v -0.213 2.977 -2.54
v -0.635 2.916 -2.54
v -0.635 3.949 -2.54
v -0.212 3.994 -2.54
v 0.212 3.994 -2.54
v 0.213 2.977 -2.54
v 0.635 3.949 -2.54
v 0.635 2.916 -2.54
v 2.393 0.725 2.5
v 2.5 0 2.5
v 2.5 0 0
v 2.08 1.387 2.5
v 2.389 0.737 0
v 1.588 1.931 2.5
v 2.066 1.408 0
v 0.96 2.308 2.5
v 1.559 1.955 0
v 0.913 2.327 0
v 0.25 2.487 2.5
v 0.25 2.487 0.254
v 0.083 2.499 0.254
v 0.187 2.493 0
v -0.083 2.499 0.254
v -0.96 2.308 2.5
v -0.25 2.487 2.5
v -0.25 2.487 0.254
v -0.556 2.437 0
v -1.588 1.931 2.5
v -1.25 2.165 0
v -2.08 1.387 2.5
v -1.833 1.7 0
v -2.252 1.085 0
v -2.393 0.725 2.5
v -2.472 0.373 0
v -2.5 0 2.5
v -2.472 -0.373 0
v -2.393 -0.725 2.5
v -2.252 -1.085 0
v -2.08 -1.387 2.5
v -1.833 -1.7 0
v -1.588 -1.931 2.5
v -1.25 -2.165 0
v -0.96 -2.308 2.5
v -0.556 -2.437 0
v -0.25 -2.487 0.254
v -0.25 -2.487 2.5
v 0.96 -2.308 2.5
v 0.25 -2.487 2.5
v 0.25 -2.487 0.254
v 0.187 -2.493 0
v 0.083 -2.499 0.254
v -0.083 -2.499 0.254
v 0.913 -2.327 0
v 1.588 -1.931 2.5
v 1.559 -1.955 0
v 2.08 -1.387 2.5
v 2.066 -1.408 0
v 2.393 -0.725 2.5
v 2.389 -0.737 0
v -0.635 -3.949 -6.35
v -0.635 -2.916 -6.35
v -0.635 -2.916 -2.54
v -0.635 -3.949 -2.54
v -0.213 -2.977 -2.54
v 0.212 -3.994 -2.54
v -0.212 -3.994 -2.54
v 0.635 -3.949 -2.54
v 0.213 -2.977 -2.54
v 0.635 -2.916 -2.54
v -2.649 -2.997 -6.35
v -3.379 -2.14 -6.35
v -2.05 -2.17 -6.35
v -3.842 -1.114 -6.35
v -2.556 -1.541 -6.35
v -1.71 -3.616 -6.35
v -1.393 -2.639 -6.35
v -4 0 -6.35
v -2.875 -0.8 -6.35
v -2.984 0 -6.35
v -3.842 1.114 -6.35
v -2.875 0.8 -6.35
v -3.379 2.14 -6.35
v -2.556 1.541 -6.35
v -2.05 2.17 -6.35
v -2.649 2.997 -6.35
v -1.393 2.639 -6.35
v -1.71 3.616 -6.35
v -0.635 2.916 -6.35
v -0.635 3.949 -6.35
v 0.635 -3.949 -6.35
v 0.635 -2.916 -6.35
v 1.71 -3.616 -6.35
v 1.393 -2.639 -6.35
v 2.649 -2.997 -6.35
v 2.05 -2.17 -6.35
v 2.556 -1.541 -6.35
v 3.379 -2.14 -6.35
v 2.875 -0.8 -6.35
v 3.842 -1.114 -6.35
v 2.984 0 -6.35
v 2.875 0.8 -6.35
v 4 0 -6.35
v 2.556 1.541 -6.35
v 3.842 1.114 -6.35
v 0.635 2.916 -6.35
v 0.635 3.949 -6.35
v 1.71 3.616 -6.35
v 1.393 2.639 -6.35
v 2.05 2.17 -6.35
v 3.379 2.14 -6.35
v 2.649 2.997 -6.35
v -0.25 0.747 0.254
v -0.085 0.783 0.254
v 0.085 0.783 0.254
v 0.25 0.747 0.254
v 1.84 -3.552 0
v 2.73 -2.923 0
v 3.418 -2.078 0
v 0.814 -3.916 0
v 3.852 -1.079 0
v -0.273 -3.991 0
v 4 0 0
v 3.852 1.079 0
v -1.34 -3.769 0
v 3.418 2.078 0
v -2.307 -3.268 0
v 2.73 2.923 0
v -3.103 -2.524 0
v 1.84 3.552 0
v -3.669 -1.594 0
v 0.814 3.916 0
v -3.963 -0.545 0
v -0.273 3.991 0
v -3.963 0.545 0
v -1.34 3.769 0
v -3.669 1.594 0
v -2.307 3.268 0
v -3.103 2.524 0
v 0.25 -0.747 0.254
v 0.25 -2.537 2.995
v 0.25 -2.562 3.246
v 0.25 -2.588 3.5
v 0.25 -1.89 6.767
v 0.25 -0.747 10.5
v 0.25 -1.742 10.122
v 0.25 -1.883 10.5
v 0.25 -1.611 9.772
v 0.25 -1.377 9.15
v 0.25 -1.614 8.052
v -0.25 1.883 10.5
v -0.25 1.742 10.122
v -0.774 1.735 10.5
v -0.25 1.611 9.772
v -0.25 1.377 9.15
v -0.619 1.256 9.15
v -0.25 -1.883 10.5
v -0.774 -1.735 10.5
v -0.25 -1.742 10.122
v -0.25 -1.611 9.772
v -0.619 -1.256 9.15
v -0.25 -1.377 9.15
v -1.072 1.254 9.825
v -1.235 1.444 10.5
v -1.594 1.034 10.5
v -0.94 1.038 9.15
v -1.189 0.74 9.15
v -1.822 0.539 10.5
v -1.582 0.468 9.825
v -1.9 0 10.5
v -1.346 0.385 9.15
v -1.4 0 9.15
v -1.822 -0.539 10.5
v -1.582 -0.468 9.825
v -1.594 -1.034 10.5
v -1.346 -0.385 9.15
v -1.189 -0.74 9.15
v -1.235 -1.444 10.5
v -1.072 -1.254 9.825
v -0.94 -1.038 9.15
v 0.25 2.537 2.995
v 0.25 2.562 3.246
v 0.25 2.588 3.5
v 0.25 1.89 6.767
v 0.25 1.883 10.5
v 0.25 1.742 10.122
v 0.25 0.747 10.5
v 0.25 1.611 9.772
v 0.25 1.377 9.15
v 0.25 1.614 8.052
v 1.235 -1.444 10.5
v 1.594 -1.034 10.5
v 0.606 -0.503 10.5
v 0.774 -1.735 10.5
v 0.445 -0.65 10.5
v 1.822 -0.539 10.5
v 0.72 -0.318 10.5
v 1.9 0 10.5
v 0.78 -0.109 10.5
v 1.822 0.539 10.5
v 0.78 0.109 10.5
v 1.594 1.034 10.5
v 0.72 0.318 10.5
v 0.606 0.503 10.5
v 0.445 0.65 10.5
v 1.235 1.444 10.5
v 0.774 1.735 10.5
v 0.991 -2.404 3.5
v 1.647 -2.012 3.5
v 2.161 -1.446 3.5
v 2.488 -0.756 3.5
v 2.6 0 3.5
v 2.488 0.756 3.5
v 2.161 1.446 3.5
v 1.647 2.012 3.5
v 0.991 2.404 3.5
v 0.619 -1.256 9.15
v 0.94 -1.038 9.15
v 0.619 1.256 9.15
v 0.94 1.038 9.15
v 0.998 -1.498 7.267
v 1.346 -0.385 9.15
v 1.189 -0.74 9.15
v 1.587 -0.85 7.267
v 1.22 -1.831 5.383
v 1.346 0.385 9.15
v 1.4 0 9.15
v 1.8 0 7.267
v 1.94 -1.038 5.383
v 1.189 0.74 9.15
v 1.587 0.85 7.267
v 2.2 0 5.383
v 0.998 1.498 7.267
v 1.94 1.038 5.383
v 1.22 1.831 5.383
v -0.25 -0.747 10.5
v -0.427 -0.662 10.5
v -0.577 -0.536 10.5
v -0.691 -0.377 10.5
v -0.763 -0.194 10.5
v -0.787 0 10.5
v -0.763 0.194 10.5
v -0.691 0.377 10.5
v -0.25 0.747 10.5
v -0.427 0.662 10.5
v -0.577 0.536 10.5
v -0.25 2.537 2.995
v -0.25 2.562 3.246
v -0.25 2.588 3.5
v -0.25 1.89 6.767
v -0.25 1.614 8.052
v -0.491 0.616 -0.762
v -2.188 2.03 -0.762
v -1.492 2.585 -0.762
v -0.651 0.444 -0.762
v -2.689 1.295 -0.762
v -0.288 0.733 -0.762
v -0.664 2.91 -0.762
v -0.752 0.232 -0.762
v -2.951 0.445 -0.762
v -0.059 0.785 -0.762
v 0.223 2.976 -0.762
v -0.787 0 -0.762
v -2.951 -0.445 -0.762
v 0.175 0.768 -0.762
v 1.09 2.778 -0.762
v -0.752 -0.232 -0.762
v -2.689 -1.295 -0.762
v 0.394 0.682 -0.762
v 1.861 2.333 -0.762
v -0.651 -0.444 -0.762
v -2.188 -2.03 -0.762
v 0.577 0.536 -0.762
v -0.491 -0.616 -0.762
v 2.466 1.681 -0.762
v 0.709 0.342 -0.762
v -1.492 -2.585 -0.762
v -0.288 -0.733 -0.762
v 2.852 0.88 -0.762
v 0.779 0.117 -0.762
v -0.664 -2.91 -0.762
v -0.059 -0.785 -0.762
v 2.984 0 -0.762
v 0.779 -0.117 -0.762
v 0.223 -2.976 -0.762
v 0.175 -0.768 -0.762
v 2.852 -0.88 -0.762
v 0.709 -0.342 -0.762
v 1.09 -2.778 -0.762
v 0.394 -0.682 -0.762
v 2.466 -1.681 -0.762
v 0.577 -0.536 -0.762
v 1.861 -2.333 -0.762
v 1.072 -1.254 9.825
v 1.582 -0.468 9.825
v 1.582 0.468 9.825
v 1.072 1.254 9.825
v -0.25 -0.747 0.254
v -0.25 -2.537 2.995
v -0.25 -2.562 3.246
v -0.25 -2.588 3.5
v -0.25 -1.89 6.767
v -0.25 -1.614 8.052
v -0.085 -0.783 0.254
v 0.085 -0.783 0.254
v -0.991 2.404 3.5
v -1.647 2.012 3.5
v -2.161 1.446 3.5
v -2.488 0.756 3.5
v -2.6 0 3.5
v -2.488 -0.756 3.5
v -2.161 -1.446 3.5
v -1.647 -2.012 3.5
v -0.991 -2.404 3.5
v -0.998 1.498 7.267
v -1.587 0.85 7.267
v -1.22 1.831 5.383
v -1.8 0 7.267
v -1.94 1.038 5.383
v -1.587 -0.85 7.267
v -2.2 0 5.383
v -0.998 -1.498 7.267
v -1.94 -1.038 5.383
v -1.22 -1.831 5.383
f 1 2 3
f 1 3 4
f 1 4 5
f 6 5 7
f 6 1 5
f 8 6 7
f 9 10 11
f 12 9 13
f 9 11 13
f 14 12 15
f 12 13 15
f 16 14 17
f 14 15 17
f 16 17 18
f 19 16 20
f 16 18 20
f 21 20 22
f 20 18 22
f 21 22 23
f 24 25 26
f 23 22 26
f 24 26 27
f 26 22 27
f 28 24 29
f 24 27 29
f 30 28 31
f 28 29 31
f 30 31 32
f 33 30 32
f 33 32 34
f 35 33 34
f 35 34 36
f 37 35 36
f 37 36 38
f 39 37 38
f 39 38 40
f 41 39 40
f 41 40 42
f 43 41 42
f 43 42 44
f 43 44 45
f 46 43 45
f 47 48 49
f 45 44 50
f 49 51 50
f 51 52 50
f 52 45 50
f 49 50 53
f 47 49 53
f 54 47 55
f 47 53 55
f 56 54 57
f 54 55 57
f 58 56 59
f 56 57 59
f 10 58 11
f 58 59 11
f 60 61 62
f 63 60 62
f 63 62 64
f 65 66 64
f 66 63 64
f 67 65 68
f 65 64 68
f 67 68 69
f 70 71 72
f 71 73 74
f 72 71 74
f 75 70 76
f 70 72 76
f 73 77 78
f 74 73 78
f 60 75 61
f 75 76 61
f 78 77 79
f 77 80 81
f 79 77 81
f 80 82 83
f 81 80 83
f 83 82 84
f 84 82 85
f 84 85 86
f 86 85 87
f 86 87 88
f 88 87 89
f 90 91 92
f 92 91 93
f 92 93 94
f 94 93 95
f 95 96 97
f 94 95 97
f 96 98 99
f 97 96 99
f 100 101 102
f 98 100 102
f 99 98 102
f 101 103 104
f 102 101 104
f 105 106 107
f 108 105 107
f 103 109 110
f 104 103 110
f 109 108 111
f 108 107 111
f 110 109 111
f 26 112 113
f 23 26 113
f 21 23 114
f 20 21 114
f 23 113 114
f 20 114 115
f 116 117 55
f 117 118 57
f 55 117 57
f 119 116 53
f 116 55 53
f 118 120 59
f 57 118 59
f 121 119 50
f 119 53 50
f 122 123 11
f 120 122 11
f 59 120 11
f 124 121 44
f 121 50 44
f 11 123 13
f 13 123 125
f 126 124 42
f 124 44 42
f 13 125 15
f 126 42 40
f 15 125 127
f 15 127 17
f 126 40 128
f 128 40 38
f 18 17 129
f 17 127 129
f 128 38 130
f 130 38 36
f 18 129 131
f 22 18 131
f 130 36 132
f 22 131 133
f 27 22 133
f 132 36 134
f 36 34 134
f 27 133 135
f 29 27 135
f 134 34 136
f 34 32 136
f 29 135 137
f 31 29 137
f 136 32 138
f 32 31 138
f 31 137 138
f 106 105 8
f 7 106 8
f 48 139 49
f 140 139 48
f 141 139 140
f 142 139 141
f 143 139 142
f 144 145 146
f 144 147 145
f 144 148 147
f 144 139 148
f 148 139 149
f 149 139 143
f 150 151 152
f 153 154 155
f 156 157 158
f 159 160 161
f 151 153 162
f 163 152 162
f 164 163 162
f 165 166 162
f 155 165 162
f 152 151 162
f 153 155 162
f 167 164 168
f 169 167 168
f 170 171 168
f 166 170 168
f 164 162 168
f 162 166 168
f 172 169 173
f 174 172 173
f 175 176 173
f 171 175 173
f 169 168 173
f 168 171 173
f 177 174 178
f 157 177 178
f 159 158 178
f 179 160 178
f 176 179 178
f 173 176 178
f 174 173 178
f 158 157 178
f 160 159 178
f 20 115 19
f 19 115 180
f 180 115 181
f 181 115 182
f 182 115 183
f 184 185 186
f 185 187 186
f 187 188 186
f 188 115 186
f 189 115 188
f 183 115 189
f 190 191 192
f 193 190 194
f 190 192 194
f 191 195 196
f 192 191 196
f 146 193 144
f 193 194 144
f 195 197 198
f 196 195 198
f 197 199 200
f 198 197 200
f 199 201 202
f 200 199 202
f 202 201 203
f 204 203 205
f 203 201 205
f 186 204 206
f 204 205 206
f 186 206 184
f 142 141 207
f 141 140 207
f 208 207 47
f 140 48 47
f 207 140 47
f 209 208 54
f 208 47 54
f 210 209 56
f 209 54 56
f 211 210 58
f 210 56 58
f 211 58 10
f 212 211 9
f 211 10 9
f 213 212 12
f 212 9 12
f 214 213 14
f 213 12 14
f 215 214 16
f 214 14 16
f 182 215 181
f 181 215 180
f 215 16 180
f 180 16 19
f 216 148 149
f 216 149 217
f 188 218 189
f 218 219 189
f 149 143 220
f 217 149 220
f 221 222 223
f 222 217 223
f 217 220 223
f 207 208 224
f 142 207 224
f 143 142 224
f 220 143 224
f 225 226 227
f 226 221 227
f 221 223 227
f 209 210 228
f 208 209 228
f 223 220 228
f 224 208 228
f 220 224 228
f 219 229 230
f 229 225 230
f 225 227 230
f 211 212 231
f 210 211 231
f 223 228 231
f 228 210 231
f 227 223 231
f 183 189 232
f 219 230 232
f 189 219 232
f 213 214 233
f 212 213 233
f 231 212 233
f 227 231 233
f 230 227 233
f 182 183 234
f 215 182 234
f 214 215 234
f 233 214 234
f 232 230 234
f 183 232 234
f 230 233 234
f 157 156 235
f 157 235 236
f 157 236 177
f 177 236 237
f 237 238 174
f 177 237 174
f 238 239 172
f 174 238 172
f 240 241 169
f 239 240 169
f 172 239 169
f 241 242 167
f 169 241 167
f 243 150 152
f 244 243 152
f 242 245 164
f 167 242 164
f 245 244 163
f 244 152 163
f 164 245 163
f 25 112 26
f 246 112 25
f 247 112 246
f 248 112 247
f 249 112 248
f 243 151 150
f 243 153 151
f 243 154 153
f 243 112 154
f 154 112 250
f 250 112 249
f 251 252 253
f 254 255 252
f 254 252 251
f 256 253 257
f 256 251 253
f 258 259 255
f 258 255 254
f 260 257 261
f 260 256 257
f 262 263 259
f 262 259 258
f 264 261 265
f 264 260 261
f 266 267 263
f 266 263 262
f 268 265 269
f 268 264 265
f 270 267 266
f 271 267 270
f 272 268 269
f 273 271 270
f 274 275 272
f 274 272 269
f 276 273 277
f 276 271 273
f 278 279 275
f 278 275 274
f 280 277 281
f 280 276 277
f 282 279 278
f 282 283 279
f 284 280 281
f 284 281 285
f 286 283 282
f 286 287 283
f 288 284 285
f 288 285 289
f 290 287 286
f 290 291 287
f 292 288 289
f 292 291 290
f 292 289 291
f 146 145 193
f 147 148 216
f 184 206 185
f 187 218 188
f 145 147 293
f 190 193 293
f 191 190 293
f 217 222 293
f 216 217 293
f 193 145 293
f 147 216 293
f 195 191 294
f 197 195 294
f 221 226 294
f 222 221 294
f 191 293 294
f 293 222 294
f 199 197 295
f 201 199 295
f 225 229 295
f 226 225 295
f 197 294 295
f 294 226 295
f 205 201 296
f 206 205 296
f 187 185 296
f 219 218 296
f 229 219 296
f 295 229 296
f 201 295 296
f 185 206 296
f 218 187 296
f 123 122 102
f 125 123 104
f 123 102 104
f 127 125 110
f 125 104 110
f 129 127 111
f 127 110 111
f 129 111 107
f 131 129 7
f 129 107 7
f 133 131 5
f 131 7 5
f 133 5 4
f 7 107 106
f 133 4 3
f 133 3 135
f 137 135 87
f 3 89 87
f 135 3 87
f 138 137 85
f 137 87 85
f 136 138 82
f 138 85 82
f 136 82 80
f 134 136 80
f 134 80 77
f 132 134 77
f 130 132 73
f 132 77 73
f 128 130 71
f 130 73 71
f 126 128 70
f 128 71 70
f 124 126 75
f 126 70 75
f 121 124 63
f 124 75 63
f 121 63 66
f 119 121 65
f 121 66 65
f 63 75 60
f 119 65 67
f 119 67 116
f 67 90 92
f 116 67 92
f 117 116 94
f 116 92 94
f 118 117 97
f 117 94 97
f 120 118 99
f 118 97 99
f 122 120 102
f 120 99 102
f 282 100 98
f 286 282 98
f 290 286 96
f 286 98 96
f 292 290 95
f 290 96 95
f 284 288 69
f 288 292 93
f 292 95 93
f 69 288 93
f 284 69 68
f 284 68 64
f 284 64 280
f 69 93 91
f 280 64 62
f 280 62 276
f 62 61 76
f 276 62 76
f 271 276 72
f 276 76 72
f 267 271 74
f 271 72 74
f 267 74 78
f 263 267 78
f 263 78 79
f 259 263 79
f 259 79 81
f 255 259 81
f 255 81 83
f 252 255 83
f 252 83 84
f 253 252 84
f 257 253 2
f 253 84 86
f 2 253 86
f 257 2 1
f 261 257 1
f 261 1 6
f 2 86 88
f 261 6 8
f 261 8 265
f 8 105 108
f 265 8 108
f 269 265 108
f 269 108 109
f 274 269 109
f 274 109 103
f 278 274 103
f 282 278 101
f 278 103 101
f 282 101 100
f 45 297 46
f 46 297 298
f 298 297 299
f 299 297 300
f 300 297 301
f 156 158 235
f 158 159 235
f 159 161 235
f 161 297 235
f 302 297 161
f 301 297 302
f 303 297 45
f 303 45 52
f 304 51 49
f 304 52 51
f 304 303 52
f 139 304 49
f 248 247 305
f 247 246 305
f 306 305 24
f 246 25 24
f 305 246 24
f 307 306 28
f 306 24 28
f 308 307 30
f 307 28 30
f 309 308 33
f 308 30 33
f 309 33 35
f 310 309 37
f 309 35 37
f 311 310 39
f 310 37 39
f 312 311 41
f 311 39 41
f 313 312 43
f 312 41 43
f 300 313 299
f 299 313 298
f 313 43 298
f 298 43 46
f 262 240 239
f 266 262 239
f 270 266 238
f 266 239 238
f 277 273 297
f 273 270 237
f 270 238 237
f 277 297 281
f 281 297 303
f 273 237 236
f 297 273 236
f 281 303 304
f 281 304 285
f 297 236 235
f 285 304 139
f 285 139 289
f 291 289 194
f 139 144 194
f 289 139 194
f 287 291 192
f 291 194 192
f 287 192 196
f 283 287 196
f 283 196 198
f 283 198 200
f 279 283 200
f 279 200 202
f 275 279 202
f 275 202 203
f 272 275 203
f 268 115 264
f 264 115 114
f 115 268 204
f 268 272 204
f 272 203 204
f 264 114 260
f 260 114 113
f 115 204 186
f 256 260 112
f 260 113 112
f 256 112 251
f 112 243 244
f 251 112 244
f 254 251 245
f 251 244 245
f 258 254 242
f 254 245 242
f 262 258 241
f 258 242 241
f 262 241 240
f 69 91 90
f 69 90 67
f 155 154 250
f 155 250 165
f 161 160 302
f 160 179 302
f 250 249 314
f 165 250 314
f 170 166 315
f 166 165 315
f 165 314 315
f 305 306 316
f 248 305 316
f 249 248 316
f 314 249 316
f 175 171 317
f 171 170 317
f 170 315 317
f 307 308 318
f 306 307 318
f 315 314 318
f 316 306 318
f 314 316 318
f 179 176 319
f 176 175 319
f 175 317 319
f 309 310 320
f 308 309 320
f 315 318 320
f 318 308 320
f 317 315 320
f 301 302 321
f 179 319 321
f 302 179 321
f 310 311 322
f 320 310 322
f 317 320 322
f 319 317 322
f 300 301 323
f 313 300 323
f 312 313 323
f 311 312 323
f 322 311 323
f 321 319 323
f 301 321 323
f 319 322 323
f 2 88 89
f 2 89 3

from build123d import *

# Parameters (mm, degrees)
SKETCH001_R          = 2.9845
POCKET_DEPTH         = 5.588
SKETCH002_R          = 0.7874
POCKET001_DEPTH      = 16.851
SKETCH004_W          = 0.5
SKETCH004_H          = 12.688059
SKETCH004_H_2        = 6.122161
POCKET003_DEPTH      = 5.0038
POCKET003_DEPTH_BACK = -5.0038
SKETCH005_W          = 1.27
SKETCH005_H          = 12.7
POCKET004_DEPTH      = 25.4
POCKET004_DEPTH_BACK = -23.7998


with BuildPart() as part:
    # Sketch → Revolution (revolve)
    with BuildSketch(Plane.XZ):
        Polygon((2.5, 0), (4, 0), (4, -6.35), (0, -6.35), (0, 0), (0, 10.5), (1.9, 10.5), (1.4, 9.15), (2.6, 3.5), (2.5, 2.5), align=None)
    revolve(axis=Axis((0, 0, 0), (0, 0, 1)))

    # Sketch001 (on Face5 of Revolution) → Pocket (cut)
    with BuildSketch(Plane(origin=(0, 0, -6.35), x_dir=(1, 0, 0), z_dir=(0, 0, -1))):
        Circle(SKETCH001_R)
    extrude(amount=-POCKET_DEPTH, mode=Mode.SUBTRACT)

    # Sketch002 (on Face6 of Pocket) → Pocket001 (cut, through all)
    with BuildSketch(Plane(origin=(0, 0, 10.5), x_dir=(-1, 0, 0), z_dir=(0, 0, 1))):
        Circle(SKETCH002_R)
    extrude(amount=-POCKET001_DEPTH, mode=Mode.SUBTRACT)

    # Sketch004 → Pocket003 (cut, two sides)
    with BuildSketch(Plane.XZ) as pocket003_sk:
        with Locations((0, 6.598029)):
            Rectangle(SKETCH004_W, SKETCH004_H)
        with Locations((0, -13.475635)):
            Rectangle(SKETCH004_W, SKETCH004_H_2)
    extrude(amount=-POCKET003_DEPTH, mode=Mode.SUBTRACT)
    extrude(pocket003_sk.sketch, amount=-POCKET003_DEPTH_BACK, mode=Mode.SUBTRACT)

    # Sketch005 → Pocket004 (cut, two sides)
    with BuildSketch(Plane.XZ) as pocket004_sk:
        with Locations((0, -8.89)):
            Rectangle(SKETCH005_W, SKETCH005_H)
    extrude(amount=-POCKET004_DEPTH, mode=Mode.SUBTRACT)
    extrude(pocket004_sk.sketch, amount=-POCKET004_DEPTH_BACK, mode=Mode.SUBTRACT)


solid = part.part
